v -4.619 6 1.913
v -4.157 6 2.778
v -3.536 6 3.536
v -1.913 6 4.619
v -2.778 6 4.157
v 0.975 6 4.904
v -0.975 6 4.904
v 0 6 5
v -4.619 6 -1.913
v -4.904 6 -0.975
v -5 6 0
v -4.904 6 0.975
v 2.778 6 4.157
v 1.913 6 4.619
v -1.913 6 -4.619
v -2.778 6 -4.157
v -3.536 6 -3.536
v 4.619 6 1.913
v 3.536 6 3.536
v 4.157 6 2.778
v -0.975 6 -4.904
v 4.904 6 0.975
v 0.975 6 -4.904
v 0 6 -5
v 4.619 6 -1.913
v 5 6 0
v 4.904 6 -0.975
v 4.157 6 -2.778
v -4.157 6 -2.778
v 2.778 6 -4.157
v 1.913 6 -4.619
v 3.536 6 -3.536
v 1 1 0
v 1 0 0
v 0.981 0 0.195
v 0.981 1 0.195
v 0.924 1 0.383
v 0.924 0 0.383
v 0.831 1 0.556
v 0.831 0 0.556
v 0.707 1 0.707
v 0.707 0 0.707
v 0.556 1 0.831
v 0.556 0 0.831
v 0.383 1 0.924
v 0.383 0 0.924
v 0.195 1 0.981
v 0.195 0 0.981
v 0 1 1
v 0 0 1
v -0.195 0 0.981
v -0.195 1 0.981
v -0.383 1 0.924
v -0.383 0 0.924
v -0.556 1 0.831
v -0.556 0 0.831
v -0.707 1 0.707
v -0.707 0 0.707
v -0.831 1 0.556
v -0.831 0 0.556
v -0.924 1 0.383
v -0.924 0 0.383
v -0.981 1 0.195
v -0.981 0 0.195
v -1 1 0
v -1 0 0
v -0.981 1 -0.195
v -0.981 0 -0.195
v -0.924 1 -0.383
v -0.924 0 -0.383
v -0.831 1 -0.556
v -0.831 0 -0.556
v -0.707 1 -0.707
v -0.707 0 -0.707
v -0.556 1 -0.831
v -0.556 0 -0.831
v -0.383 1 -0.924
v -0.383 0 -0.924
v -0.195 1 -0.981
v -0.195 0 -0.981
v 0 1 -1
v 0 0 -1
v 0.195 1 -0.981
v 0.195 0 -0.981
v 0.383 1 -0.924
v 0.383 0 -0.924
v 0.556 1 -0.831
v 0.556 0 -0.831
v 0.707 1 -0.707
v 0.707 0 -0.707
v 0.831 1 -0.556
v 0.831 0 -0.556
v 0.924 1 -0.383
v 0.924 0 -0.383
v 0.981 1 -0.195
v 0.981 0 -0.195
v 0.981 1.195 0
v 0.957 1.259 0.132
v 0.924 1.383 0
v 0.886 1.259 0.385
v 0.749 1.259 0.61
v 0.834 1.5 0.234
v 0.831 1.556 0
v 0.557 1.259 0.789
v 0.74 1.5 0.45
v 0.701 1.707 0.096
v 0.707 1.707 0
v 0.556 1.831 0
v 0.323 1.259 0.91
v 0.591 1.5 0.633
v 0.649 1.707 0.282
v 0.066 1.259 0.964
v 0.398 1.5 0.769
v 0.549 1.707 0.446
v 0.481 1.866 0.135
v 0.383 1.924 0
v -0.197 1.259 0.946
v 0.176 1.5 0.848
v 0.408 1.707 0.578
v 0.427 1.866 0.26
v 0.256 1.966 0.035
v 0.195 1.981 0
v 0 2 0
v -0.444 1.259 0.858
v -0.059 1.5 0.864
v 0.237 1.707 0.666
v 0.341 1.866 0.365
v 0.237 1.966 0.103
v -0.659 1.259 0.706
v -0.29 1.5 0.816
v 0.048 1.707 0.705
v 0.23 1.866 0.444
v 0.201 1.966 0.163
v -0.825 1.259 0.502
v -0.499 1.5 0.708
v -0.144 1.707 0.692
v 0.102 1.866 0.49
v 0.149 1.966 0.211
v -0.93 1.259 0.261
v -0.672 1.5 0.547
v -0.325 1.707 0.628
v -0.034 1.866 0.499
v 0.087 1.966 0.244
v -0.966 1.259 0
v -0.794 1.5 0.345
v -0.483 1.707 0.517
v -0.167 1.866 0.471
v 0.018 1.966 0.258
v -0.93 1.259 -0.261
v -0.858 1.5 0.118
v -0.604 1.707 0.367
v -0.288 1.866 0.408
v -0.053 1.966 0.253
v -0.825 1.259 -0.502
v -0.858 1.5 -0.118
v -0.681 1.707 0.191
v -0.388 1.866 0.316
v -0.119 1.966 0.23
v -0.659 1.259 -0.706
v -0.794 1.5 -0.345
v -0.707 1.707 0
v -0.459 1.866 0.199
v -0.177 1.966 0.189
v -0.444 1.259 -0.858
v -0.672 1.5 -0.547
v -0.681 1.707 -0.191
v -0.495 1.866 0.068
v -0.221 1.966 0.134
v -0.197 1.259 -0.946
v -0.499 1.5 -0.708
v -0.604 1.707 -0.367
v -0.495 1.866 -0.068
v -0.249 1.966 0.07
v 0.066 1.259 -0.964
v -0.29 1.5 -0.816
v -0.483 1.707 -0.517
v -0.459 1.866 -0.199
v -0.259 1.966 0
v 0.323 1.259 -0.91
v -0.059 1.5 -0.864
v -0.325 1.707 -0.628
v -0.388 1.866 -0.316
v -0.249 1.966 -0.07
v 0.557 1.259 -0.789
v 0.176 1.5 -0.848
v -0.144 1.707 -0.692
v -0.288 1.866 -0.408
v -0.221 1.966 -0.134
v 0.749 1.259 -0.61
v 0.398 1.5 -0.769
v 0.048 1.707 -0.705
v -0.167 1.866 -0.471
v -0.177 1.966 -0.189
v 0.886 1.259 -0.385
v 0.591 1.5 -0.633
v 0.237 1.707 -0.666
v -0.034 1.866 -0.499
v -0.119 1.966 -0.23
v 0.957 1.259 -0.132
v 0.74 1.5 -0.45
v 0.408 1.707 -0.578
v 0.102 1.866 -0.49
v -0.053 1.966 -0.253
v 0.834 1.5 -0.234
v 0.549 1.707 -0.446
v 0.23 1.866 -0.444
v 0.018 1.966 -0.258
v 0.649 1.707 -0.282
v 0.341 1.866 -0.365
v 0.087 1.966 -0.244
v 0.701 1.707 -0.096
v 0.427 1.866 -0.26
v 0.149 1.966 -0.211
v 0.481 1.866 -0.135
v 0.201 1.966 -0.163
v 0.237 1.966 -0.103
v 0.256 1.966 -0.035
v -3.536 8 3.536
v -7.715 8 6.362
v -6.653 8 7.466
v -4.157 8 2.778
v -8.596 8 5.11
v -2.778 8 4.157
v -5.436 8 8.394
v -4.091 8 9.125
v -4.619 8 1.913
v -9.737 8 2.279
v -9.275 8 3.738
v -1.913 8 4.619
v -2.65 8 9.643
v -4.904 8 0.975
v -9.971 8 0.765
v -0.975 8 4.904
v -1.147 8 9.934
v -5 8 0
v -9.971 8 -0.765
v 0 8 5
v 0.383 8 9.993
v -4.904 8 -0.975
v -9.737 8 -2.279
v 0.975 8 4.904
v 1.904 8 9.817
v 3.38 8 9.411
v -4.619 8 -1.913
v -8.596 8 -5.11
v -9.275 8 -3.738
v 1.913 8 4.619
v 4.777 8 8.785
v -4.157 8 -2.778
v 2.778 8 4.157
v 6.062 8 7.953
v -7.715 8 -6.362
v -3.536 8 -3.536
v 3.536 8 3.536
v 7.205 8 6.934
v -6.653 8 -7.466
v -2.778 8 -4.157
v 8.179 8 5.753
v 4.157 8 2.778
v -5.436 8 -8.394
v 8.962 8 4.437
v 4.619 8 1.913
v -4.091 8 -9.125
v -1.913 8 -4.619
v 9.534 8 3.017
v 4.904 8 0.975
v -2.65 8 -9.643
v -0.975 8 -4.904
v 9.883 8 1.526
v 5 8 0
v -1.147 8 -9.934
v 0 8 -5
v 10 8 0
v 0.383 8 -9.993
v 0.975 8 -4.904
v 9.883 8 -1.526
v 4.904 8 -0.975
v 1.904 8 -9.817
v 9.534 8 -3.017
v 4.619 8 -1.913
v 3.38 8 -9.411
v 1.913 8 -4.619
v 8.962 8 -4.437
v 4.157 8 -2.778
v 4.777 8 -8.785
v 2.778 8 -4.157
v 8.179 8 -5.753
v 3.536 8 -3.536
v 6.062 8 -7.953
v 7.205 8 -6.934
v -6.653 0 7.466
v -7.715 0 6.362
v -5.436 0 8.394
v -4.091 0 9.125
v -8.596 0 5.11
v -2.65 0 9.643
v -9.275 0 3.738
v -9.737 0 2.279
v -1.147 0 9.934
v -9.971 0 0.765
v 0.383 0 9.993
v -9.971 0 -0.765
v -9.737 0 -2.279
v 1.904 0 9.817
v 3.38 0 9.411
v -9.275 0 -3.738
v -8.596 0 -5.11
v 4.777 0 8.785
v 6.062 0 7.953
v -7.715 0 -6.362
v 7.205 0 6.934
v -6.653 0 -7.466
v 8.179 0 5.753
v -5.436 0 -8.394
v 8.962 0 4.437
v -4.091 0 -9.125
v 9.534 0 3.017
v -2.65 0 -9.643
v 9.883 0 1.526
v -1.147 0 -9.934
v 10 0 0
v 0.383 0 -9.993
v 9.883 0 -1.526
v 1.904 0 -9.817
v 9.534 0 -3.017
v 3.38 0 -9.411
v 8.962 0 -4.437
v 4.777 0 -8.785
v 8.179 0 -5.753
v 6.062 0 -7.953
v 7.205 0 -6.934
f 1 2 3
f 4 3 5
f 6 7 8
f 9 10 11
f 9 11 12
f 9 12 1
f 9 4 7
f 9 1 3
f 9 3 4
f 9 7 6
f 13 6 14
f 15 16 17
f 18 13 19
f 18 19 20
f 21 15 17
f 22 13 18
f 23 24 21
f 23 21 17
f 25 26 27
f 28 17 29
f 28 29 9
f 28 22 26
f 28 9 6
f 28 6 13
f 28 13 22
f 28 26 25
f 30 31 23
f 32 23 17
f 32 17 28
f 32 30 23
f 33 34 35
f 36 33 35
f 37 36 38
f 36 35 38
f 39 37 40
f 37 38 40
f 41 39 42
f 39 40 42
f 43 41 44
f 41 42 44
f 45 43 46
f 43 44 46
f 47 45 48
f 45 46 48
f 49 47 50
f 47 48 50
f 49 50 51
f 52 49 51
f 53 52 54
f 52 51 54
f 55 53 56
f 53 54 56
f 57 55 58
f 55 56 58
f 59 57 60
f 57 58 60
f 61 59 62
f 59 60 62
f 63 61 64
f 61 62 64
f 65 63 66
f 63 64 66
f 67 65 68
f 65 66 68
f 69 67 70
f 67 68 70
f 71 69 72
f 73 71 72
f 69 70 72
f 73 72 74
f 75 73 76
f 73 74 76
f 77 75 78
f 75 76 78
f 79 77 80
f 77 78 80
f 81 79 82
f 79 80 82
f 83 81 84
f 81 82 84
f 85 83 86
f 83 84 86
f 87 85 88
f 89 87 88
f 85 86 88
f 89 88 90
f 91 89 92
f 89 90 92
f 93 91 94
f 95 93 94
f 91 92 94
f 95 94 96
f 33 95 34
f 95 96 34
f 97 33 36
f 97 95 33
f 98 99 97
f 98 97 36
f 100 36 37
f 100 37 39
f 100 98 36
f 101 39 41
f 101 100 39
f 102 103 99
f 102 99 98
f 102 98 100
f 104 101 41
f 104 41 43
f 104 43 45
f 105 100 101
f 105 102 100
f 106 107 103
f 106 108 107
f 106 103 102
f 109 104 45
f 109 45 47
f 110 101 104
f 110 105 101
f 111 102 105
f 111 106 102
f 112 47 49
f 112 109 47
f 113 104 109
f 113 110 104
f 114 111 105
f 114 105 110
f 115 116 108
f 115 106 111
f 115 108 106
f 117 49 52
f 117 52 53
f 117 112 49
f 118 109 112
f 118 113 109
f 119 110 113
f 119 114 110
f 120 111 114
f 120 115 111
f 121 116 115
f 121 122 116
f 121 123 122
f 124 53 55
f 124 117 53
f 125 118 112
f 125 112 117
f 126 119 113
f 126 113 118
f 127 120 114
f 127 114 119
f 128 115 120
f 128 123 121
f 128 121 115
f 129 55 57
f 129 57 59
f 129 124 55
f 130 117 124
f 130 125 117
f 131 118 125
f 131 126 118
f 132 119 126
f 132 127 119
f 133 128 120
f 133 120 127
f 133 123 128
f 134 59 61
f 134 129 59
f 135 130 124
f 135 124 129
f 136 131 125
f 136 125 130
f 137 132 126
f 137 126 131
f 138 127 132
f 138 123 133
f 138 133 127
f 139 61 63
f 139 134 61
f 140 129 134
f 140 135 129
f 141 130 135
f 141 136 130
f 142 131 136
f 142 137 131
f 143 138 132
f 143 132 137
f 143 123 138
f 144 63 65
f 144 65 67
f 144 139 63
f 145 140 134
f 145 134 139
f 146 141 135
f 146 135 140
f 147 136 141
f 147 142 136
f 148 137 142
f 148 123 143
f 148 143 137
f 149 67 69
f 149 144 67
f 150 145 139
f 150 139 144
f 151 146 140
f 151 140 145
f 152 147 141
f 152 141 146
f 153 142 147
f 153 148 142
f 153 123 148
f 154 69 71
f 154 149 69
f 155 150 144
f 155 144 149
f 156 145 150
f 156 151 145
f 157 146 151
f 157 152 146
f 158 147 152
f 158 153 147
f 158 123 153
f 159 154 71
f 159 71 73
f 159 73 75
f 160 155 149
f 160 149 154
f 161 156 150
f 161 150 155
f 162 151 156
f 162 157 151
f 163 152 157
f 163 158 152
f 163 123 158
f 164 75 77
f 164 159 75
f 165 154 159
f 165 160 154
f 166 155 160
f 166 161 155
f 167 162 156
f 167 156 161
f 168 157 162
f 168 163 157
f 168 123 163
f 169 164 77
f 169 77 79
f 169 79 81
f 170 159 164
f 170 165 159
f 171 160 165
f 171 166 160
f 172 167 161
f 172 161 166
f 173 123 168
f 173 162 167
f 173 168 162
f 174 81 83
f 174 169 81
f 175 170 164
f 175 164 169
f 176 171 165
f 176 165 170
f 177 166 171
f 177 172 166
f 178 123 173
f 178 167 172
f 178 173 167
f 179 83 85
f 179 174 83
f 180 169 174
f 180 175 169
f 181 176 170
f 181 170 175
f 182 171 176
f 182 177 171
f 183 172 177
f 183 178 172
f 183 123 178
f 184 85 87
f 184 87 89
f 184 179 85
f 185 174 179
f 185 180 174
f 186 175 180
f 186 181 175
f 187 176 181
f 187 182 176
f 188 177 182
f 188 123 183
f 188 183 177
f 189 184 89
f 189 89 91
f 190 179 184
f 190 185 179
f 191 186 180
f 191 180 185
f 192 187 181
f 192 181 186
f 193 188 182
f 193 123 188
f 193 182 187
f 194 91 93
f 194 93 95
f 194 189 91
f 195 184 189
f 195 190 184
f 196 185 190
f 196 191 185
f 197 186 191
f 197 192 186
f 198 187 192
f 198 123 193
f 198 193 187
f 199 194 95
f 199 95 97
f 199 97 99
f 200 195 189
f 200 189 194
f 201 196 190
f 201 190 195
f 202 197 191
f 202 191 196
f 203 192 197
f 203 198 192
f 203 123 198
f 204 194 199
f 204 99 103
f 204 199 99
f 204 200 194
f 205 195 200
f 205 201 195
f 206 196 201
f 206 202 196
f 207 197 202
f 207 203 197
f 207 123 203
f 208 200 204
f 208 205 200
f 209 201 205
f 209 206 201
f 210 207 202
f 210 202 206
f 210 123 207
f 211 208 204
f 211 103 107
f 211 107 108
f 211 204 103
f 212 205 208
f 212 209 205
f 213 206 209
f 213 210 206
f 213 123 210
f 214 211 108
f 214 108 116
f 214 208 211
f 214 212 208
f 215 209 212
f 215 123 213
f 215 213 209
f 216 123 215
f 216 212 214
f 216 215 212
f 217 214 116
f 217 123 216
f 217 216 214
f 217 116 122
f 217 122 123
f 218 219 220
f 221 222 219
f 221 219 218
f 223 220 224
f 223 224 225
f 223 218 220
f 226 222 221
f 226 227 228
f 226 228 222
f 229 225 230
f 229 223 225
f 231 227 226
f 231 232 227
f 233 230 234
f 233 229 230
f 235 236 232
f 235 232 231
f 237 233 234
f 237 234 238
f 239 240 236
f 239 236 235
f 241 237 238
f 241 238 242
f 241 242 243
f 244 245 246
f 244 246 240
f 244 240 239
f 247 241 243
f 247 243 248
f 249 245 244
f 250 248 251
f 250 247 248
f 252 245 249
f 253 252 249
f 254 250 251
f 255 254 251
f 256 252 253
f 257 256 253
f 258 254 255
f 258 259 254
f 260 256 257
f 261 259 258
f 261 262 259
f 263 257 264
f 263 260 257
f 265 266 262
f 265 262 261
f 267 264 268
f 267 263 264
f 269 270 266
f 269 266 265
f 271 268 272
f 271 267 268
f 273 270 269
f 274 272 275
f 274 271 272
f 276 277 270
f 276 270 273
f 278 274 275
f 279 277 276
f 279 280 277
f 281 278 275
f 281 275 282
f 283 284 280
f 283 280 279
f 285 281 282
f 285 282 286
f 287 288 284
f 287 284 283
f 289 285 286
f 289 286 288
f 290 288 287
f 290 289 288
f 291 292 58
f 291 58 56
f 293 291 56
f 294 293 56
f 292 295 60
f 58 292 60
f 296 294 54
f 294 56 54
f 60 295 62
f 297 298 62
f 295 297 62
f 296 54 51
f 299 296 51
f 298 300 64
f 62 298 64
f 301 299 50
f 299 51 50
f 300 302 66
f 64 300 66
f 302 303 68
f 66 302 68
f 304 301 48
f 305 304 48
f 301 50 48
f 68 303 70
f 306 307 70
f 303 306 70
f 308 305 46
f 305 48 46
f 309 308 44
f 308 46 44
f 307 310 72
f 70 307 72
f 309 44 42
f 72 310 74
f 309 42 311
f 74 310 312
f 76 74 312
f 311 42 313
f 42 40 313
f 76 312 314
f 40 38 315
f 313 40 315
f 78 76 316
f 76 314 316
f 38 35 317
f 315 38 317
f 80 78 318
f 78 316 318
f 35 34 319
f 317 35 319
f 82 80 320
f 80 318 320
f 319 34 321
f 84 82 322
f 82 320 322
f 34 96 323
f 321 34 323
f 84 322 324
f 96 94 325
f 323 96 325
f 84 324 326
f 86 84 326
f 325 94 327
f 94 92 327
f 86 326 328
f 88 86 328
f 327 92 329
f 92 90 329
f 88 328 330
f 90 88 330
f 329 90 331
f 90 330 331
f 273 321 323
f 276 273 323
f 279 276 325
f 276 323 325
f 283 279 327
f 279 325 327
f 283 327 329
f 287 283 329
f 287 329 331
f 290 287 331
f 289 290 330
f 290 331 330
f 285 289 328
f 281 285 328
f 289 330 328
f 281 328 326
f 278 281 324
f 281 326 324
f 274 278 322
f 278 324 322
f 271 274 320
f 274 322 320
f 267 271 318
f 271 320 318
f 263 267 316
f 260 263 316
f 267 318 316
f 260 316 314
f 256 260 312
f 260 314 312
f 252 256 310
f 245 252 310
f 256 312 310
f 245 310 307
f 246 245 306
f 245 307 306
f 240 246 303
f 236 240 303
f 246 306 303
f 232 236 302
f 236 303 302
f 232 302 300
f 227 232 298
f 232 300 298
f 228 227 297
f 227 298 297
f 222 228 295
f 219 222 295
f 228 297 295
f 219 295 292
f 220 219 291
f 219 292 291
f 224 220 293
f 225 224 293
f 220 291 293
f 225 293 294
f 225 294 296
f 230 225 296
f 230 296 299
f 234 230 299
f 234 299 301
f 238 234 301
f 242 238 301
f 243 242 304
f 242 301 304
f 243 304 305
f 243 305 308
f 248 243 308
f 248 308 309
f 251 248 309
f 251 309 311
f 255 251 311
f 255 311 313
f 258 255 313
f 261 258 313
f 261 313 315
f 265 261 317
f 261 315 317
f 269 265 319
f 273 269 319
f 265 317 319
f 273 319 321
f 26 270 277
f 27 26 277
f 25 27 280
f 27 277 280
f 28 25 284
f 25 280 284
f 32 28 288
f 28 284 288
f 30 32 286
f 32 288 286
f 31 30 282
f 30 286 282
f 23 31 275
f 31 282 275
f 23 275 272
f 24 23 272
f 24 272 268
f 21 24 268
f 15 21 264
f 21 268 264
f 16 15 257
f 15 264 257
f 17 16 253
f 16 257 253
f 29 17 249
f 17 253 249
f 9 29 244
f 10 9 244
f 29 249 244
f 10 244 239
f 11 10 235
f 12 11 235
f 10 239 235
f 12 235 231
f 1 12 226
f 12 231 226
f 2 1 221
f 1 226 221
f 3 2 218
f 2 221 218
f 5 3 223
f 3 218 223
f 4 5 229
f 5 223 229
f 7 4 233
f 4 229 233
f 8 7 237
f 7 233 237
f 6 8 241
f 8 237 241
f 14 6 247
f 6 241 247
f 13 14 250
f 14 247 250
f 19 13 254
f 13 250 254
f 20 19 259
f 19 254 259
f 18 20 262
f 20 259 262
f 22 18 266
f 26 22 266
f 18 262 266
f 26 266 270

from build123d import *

# Parameters (mm, degrees)
SKETCH1_R           = 10
BOSS_EXTRUDE1_DEPTH = 8
SKETCH2_R           = 5
CUT_EXTRUDE1_DEPTH  = 2
SKETCH3_R           = 1
CUT_EXTRUDE2_DEPTH  = 2
FILLET1_R           = 1


with BuildPart() as part:
    # Sketch1 → Boss-Extrude1 (new body)
    with BuildSketch(Plane(origin=(0, 0, 0), x_dir=(1, 0, 0), z_dir=(0, 1, 0))):
        Circle(SKETCH1_R)
    extrude(amount=BOSS_EXTRUDE1_DEPTH)

    # Sketch2 → Cut-Extrude1 (cut)
    with BuildSketch(Plane(origin=(0, 8, 0), x_dir=(1, 0, 0), z_dir=(0, 1, 0))):
        Circle(SKETCH2_R)
    extrude(amount=-CUT_EXTRUDE1_DEPTH, mode=Mode.SUBTRACT)

    # Sketch3 → Cut-Extrude2 (cut)
    with BuildSketch(Plane.XZ):
        Circle(SKETCH3_R)
    extrude(amount=-CUT_EXTRUDE2_DEPTH, mode=Mode.SUBTRACT)

    # Fillet1
    fillet1_edges = [part.edges().sort_by_distance(p)[0] for p in [
        (-1, 2, 0),
    ]]
    fillet(fillet1_edges, radius=FILLET1_R)


solid = part.part
